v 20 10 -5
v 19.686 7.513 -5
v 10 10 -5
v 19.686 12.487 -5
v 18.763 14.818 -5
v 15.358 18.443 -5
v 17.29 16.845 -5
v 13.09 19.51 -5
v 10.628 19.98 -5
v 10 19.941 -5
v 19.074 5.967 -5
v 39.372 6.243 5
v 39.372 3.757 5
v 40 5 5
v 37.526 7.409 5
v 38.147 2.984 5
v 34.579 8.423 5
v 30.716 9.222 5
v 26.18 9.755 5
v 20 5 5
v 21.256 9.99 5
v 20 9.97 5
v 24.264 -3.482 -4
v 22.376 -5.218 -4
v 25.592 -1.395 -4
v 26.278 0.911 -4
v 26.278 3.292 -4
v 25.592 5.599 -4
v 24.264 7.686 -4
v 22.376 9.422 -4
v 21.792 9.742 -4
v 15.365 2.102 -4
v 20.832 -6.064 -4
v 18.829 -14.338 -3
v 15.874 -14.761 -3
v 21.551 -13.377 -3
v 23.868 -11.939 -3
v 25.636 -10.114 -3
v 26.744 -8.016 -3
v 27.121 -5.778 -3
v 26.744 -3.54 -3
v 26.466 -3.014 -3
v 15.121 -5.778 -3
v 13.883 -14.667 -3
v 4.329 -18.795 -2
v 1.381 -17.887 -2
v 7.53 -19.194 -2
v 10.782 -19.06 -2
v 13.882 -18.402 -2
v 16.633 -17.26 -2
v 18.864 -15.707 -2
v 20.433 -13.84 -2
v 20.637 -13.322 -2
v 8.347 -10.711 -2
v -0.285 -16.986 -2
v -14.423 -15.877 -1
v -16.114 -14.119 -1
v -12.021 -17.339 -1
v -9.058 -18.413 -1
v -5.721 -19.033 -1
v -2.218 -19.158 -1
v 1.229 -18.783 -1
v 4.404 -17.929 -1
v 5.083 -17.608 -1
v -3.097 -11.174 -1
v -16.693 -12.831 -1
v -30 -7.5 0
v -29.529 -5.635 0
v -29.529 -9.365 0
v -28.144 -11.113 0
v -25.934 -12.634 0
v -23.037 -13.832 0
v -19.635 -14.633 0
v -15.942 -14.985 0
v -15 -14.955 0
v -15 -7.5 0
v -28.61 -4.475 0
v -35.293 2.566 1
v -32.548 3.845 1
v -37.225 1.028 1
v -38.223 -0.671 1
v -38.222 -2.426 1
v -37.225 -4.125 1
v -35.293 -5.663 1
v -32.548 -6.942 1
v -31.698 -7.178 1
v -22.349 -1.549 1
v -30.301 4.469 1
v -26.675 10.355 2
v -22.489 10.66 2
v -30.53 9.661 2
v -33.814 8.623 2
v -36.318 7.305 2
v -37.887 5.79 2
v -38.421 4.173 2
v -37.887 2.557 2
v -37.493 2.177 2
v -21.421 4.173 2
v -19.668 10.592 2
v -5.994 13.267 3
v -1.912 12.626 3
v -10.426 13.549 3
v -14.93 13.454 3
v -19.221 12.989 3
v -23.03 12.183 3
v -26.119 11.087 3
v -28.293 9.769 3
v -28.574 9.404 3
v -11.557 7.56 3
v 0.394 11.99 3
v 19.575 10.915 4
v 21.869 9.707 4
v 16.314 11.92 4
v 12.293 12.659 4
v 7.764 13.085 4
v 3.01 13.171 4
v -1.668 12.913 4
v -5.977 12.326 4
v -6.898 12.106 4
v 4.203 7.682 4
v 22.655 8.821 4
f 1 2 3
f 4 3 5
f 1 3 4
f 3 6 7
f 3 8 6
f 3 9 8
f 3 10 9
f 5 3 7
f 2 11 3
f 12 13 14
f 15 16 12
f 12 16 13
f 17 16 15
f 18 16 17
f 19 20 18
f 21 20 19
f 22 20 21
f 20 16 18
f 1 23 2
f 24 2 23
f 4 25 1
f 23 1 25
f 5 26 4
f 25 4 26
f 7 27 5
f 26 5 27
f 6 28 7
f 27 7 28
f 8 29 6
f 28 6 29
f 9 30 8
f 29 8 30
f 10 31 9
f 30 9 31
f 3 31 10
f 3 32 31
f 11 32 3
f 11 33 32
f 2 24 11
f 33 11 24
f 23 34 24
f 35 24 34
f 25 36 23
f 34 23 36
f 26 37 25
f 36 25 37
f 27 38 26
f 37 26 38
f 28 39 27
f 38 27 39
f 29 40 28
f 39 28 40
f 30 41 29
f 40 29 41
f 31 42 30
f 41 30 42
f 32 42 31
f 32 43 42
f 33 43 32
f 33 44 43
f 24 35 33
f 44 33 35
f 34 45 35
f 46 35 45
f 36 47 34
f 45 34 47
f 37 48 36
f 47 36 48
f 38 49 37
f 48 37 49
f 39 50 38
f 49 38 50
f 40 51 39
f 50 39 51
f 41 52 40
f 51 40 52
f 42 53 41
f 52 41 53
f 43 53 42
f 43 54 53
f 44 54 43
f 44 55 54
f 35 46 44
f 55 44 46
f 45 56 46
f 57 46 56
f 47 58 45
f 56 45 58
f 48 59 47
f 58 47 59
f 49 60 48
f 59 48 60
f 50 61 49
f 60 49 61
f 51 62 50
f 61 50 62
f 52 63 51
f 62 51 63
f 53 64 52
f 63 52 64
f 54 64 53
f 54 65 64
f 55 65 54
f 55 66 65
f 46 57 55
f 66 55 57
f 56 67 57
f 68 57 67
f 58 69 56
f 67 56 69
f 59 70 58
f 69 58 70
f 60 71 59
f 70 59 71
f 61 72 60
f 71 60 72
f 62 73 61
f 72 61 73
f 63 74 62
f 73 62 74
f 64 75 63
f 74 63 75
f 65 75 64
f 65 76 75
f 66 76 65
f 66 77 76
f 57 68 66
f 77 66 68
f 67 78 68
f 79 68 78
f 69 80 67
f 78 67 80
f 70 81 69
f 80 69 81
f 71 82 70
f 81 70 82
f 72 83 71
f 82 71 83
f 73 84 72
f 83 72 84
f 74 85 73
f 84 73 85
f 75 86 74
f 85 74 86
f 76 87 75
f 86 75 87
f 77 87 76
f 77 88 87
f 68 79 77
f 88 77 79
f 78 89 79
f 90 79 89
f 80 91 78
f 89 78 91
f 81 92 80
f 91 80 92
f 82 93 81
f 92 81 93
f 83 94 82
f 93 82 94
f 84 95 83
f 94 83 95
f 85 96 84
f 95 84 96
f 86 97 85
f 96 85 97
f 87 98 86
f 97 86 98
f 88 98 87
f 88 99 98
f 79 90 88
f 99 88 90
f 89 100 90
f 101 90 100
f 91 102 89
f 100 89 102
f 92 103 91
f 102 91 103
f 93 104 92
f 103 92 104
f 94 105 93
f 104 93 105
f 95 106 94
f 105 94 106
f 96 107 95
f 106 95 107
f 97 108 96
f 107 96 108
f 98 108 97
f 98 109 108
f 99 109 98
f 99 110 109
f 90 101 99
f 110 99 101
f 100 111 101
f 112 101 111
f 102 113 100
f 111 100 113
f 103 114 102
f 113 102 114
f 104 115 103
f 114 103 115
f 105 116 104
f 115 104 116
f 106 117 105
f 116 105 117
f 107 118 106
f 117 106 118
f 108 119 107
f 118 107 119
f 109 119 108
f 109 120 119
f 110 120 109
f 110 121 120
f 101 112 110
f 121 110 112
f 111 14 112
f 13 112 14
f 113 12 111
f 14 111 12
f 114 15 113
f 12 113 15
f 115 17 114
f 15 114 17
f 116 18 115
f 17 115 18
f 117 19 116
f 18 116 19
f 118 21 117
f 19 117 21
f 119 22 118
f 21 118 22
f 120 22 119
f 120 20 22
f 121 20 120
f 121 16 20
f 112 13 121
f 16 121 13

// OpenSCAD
SIZE = [10, 10];
$fn = 25;
module extrude_square(size = [1, 1], center = true) {
  linear_extrude(
    height = size.x,
    center = center,
    convexity = 10,
    twist = 360,
    // segments = 1,
    scale = [2, 1/2],
    slices = 10
  ) {
    translate(size) {
      scale(size)
      intersection() {
          polygon(points = [
            [0, 0],
            [0, 1],
            [2.25, 2.25],
            [2.25, -1]
        ]);
      square(size = size, center = center);
      square(size = size.x, center = center);
      circle(d = size * 2);
      }
    }
  }
}

extrude_square(size = SIZE);
